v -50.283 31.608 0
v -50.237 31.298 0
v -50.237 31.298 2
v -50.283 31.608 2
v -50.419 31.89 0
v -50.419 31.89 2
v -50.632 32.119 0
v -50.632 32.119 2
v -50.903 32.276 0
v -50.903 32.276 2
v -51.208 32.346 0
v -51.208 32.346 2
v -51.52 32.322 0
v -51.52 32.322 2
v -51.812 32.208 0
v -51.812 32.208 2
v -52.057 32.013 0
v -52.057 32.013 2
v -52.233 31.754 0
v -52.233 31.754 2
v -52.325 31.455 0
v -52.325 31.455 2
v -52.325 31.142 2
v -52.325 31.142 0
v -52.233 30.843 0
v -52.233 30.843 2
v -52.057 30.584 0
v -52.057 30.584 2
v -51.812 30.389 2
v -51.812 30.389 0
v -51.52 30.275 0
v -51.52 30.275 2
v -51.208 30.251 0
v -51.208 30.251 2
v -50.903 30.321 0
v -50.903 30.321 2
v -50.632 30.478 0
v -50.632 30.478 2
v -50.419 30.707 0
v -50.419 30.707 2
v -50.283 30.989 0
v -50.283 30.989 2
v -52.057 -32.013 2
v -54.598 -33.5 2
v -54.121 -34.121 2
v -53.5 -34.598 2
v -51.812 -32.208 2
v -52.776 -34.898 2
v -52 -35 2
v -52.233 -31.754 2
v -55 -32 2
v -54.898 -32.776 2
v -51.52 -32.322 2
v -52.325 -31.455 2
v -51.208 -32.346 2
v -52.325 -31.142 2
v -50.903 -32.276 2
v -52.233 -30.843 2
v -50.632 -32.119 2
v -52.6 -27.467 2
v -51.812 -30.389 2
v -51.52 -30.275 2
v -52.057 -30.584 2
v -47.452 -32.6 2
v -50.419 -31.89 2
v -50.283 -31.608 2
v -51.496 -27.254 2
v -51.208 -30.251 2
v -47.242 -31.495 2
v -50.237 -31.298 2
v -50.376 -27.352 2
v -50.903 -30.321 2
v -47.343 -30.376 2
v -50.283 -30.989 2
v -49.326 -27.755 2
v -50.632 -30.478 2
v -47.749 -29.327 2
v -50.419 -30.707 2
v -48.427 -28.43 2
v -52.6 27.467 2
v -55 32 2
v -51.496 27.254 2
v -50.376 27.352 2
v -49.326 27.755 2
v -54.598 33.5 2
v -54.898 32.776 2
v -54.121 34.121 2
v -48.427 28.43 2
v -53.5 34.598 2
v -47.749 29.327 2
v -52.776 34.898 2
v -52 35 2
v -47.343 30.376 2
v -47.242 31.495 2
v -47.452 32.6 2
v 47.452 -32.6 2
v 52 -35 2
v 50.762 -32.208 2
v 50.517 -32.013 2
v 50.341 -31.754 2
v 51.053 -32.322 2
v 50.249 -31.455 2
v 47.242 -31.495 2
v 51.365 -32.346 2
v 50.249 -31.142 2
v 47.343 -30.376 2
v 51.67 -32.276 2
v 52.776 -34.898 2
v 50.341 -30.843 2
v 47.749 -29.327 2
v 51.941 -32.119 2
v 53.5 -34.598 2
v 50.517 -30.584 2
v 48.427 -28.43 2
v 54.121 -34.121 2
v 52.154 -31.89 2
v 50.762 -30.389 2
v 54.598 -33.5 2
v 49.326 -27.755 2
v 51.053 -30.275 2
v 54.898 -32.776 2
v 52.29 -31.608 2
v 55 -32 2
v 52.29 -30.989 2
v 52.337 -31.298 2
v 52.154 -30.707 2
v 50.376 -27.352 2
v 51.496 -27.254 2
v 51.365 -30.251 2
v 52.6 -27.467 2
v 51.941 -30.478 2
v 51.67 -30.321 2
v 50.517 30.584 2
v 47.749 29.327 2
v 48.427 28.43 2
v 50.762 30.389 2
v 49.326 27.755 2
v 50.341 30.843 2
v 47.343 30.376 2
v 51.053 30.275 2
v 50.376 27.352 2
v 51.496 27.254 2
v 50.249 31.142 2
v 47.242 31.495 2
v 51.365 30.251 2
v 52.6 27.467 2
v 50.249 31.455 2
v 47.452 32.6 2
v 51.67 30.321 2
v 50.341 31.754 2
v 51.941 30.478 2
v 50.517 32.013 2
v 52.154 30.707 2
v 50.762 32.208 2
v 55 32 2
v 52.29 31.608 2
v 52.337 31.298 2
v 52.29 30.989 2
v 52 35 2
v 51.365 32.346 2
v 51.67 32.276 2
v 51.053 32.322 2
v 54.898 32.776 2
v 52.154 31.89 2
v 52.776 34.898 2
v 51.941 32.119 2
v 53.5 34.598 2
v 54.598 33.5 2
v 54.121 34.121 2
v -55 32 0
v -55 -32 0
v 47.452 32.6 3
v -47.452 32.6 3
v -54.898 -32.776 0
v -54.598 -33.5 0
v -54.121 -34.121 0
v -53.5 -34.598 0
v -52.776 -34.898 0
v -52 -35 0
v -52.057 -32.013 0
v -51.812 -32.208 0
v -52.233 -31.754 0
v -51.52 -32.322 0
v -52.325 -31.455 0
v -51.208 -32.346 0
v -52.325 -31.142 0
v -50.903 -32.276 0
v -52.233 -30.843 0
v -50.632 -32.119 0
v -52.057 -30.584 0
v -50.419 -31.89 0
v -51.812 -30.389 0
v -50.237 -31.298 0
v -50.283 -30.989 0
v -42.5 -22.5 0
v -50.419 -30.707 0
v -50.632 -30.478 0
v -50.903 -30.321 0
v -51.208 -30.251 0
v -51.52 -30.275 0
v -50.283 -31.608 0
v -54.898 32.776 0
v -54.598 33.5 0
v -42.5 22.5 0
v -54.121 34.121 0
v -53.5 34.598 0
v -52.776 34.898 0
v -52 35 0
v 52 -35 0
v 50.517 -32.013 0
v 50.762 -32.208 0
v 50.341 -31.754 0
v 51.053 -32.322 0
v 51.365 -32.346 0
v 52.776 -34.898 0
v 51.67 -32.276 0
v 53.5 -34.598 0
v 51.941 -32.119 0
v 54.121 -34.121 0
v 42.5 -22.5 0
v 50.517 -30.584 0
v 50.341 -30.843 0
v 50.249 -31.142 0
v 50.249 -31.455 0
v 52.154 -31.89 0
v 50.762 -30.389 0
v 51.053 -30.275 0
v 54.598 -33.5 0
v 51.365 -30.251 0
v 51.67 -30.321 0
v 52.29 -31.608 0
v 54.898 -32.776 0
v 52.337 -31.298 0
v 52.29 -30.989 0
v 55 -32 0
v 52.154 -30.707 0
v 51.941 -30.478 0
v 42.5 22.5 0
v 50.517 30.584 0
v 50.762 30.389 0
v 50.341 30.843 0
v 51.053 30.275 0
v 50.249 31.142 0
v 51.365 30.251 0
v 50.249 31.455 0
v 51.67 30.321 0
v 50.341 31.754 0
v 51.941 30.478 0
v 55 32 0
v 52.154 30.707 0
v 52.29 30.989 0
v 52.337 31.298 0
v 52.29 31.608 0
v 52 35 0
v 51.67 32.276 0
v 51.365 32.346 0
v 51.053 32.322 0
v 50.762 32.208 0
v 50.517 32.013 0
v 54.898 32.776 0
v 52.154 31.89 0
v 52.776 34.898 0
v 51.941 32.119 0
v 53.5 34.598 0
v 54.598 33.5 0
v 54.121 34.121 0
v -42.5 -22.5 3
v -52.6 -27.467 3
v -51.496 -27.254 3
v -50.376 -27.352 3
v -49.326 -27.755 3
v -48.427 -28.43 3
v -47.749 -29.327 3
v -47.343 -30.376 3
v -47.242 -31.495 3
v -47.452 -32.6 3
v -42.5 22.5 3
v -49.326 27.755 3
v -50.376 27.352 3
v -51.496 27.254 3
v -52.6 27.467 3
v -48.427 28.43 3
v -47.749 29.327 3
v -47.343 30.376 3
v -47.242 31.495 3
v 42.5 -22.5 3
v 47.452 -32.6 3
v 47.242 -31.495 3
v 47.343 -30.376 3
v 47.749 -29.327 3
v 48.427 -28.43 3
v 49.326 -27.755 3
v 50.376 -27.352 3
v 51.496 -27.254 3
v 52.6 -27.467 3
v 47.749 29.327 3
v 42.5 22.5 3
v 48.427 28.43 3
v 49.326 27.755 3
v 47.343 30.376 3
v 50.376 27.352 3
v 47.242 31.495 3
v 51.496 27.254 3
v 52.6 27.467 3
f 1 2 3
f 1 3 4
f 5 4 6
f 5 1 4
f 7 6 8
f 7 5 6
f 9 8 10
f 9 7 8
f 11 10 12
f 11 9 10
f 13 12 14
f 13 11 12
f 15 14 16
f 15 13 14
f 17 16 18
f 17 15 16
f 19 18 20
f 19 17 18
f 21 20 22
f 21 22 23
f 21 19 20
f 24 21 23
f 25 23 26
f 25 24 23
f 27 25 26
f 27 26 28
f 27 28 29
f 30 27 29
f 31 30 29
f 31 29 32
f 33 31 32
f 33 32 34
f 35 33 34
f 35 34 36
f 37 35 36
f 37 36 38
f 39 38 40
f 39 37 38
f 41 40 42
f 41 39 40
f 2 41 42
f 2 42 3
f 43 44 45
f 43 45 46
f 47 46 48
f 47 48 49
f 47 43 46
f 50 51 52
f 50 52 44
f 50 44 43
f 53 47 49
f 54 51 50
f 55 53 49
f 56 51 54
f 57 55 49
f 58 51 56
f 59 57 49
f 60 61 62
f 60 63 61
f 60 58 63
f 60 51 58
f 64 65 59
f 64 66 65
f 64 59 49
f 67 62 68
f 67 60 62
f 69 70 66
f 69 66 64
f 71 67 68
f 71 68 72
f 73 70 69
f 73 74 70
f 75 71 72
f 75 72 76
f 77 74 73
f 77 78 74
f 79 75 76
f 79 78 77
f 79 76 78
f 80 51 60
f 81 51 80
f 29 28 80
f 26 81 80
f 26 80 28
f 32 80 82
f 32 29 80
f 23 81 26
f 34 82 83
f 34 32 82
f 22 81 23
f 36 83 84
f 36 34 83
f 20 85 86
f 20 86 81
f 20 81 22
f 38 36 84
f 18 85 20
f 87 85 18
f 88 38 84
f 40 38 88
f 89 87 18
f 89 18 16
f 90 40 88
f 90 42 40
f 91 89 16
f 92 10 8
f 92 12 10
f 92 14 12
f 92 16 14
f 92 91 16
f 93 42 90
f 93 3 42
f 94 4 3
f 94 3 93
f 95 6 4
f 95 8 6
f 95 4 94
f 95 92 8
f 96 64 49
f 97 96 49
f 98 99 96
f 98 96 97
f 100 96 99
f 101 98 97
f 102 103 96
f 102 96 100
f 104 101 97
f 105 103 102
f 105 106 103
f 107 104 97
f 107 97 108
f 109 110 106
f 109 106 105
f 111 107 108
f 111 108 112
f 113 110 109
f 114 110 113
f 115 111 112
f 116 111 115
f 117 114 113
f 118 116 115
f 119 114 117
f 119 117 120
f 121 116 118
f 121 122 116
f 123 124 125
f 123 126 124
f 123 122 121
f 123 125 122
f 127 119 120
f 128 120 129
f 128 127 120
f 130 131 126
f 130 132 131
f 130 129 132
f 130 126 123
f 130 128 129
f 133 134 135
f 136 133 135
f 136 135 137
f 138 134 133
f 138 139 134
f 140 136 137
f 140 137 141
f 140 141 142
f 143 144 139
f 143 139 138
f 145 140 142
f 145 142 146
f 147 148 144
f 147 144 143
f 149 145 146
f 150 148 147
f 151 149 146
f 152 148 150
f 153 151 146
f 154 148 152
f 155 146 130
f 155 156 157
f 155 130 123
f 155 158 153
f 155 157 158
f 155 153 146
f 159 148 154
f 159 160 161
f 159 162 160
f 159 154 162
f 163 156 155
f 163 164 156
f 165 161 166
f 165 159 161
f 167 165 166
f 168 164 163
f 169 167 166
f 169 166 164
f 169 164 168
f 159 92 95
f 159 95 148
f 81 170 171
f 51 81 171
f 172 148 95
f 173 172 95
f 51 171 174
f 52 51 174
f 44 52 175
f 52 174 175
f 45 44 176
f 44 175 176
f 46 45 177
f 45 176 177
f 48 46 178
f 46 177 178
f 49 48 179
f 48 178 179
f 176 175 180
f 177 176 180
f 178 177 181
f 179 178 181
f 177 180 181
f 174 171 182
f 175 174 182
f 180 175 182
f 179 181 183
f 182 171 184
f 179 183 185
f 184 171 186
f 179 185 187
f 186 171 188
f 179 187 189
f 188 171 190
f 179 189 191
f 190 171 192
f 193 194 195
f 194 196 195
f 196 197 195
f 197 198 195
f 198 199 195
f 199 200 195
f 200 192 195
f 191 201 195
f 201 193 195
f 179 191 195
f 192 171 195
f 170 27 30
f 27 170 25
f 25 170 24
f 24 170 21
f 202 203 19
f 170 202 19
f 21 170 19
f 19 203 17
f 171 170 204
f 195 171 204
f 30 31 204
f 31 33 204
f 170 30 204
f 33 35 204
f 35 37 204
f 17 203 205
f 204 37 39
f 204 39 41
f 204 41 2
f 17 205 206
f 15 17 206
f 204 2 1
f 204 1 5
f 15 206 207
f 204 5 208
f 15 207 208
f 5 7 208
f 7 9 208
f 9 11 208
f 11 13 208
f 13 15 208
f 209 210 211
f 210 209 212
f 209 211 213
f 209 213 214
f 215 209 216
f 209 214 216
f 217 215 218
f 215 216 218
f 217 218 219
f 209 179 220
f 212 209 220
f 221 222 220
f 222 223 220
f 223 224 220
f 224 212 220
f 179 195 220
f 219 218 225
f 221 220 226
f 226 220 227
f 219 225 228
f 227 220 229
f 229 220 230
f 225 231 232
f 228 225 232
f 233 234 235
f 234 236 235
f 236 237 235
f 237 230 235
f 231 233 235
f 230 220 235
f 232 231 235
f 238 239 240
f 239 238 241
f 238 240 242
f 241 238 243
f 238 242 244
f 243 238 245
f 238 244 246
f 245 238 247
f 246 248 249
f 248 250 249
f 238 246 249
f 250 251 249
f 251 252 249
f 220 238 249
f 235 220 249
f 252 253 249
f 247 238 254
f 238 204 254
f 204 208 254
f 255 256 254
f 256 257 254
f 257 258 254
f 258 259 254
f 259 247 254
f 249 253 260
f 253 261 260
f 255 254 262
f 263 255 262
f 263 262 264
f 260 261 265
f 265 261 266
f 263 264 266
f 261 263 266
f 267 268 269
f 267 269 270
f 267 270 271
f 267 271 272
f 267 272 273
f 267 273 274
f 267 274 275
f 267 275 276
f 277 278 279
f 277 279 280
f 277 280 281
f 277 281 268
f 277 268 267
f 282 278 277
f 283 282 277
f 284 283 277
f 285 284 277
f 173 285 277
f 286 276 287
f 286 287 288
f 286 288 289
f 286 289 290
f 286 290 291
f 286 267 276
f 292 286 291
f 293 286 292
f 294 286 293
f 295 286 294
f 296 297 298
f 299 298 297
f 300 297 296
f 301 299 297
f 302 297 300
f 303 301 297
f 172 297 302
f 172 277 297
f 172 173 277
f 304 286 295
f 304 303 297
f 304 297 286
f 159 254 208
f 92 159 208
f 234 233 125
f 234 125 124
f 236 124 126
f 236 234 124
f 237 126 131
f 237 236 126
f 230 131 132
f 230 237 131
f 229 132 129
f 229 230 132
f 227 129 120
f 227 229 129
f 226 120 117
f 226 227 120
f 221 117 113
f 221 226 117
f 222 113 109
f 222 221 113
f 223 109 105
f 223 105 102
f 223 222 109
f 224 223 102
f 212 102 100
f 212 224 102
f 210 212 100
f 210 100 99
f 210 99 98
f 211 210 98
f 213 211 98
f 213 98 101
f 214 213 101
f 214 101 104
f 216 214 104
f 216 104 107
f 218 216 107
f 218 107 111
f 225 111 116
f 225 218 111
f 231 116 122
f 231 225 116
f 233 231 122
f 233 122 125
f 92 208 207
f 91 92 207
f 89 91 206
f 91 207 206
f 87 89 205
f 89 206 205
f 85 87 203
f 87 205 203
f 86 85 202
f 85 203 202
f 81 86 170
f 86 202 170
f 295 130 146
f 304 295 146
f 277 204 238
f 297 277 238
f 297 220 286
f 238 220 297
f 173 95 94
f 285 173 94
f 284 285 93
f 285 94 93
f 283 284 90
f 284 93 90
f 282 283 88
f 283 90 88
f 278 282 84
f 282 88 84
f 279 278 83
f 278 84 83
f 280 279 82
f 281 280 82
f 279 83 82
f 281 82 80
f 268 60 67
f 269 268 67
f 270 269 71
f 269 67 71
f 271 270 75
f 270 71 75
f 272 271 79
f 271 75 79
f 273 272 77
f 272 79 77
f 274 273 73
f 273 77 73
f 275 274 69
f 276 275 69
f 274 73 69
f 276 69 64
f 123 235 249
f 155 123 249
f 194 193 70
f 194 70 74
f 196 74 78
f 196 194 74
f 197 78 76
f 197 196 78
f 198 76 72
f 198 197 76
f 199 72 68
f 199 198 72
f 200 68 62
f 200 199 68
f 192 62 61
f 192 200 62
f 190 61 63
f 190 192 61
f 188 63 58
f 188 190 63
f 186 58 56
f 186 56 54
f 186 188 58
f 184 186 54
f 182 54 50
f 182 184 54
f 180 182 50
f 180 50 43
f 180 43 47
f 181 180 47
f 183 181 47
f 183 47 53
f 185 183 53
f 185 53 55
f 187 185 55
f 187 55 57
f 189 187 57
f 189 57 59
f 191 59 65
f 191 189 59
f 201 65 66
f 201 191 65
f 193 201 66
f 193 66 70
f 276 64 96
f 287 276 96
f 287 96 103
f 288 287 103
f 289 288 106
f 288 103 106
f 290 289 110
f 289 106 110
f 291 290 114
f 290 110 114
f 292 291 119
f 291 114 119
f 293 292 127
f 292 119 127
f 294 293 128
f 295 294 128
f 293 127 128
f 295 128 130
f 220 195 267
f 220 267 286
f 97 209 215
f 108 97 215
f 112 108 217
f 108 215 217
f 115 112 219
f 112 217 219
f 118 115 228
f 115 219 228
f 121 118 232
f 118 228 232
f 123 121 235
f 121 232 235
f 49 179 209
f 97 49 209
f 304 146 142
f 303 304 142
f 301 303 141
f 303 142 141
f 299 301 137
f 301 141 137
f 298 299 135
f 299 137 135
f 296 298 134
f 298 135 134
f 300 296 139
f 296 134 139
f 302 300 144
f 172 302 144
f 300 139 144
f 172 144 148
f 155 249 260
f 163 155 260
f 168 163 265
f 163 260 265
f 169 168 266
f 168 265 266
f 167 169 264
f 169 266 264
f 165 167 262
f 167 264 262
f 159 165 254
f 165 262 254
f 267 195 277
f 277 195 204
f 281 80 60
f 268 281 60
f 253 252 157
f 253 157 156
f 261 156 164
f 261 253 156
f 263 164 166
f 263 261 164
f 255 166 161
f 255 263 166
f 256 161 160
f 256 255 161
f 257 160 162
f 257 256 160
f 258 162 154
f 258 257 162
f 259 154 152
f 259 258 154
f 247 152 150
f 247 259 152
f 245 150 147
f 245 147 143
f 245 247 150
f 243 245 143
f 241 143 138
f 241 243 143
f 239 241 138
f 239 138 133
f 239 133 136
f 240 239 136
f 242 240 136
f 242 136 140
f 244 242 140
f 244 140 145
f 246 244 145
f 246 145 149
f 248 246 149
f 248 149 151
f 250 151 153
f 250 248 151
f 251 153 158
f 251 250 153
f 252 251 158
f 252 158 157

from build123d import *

# Parameters (mm, degrees)
F0_R     = 1.050001
F1_DEPTH = 2
F0_W     = 85
F0_H     = 45
F2_DEPTH = 3


with BuildPart() as f1:
    # F0 (on Top) → F1 (new body)
    with BuildSketch(Plane.XY):
        with BuildLine():
            ThreePointArc((55, 32), (54.12132, 34.12132), (52, 35))
            Line((52, 35), (-52, 35))
            ThreePointArc((-52, 35), (-54.12132, 34.12132), (-55, 32))
            Line((-55, 32), (-55, -32))
            ThreePointArc((-55, -32), (-54.12132, -34.12132), (-52, -35))
            Line((-52, -35), (52, -35))
            ThreePointArc((52, -35), (54.12132, -34.12132), (55, -32))
            Line((55, -32), (55, 32))
        make_face()
        with Locations((-51.286835, -31.298466)):
            Circle(F0_R, mode=Mode.SUBTRACT)
        with Locations((51.286835, -31.298466)):
            Circle(F0_R, mode=Mode.SUBTRACT)
        with Locations((-51.286835, 31.298466)):
            Circle(F0_R, mode=Mode.SUBTRACT)
        with BuildLine():
            ThreePointArc((47.451668, 32.600001), (48.427401, 28.430343), (52.600001, 27.467266))
            Line((52.600001, 27.467266), (52.600001, -27.467266))
            ThreePointArc((52.600001, -27.467266), (48.427401, -28.430343), (47.451668, -32.600001))
            Line((47.451668, -32.600001), (-47.451668, -32.600001))
            ThreePointArc((-47.451668, -32.600001), (-48.427401, -28.430343), (-52.600001, -27.467266))
            Line((-52.600001, -27.467266), (-52.600001, 27.467266))
            ThreePointArc((-52.600001, 27.467266), (-48.427401, 28.430343), (-47.451668, 32.600001))
            Line((-47.451668, 32.600001), (47.451668, 32.600001))
        make_face(mode=Mode.SUBTRACT)
        with Locations((51.286835, 31.298466)):
            Circle(F0_R, mode=Mode.SUBTRACT)
    extrude(amount=F1_DEPTH)

    # F0 (on Top) → F2 (join)
    with BuildSketch(Plane.XY):
        with BuildLine():
            Line((52.600001, -27.467266), (52.600001, 27.467266))
            ThreePointArc((52.600001, 27.467266), (48.427401, 28.430343), (47.451668, 32.600001))
            Line((47.451668, 32.600001), (-47.451668, 32.600001))
            ThreePointArc((-47.451668, 32.600001), (-48.427401, 28.430343), (-52.600001, 27.467266))
            Line((-52.600001, 27.467266), (-52.600001, -27.467266))
            ThreePointArc((-52.600001, -27.467266), (-48.427401, -28.430343), (-47.451668, -32.600001))
            Line((-47.451668, -32.600001), (47.451668, -32.600001))
            ThreePointArc((47.451668, -32.600001), (48.427401, -28.430343), (52.600001, -27.467266))
        make_face()
        Rectangle(F0_W, F0_H, mode=Mode.SUBTRACT)
    extrude(amount=F2_DEPTH)


solid = f1.part
